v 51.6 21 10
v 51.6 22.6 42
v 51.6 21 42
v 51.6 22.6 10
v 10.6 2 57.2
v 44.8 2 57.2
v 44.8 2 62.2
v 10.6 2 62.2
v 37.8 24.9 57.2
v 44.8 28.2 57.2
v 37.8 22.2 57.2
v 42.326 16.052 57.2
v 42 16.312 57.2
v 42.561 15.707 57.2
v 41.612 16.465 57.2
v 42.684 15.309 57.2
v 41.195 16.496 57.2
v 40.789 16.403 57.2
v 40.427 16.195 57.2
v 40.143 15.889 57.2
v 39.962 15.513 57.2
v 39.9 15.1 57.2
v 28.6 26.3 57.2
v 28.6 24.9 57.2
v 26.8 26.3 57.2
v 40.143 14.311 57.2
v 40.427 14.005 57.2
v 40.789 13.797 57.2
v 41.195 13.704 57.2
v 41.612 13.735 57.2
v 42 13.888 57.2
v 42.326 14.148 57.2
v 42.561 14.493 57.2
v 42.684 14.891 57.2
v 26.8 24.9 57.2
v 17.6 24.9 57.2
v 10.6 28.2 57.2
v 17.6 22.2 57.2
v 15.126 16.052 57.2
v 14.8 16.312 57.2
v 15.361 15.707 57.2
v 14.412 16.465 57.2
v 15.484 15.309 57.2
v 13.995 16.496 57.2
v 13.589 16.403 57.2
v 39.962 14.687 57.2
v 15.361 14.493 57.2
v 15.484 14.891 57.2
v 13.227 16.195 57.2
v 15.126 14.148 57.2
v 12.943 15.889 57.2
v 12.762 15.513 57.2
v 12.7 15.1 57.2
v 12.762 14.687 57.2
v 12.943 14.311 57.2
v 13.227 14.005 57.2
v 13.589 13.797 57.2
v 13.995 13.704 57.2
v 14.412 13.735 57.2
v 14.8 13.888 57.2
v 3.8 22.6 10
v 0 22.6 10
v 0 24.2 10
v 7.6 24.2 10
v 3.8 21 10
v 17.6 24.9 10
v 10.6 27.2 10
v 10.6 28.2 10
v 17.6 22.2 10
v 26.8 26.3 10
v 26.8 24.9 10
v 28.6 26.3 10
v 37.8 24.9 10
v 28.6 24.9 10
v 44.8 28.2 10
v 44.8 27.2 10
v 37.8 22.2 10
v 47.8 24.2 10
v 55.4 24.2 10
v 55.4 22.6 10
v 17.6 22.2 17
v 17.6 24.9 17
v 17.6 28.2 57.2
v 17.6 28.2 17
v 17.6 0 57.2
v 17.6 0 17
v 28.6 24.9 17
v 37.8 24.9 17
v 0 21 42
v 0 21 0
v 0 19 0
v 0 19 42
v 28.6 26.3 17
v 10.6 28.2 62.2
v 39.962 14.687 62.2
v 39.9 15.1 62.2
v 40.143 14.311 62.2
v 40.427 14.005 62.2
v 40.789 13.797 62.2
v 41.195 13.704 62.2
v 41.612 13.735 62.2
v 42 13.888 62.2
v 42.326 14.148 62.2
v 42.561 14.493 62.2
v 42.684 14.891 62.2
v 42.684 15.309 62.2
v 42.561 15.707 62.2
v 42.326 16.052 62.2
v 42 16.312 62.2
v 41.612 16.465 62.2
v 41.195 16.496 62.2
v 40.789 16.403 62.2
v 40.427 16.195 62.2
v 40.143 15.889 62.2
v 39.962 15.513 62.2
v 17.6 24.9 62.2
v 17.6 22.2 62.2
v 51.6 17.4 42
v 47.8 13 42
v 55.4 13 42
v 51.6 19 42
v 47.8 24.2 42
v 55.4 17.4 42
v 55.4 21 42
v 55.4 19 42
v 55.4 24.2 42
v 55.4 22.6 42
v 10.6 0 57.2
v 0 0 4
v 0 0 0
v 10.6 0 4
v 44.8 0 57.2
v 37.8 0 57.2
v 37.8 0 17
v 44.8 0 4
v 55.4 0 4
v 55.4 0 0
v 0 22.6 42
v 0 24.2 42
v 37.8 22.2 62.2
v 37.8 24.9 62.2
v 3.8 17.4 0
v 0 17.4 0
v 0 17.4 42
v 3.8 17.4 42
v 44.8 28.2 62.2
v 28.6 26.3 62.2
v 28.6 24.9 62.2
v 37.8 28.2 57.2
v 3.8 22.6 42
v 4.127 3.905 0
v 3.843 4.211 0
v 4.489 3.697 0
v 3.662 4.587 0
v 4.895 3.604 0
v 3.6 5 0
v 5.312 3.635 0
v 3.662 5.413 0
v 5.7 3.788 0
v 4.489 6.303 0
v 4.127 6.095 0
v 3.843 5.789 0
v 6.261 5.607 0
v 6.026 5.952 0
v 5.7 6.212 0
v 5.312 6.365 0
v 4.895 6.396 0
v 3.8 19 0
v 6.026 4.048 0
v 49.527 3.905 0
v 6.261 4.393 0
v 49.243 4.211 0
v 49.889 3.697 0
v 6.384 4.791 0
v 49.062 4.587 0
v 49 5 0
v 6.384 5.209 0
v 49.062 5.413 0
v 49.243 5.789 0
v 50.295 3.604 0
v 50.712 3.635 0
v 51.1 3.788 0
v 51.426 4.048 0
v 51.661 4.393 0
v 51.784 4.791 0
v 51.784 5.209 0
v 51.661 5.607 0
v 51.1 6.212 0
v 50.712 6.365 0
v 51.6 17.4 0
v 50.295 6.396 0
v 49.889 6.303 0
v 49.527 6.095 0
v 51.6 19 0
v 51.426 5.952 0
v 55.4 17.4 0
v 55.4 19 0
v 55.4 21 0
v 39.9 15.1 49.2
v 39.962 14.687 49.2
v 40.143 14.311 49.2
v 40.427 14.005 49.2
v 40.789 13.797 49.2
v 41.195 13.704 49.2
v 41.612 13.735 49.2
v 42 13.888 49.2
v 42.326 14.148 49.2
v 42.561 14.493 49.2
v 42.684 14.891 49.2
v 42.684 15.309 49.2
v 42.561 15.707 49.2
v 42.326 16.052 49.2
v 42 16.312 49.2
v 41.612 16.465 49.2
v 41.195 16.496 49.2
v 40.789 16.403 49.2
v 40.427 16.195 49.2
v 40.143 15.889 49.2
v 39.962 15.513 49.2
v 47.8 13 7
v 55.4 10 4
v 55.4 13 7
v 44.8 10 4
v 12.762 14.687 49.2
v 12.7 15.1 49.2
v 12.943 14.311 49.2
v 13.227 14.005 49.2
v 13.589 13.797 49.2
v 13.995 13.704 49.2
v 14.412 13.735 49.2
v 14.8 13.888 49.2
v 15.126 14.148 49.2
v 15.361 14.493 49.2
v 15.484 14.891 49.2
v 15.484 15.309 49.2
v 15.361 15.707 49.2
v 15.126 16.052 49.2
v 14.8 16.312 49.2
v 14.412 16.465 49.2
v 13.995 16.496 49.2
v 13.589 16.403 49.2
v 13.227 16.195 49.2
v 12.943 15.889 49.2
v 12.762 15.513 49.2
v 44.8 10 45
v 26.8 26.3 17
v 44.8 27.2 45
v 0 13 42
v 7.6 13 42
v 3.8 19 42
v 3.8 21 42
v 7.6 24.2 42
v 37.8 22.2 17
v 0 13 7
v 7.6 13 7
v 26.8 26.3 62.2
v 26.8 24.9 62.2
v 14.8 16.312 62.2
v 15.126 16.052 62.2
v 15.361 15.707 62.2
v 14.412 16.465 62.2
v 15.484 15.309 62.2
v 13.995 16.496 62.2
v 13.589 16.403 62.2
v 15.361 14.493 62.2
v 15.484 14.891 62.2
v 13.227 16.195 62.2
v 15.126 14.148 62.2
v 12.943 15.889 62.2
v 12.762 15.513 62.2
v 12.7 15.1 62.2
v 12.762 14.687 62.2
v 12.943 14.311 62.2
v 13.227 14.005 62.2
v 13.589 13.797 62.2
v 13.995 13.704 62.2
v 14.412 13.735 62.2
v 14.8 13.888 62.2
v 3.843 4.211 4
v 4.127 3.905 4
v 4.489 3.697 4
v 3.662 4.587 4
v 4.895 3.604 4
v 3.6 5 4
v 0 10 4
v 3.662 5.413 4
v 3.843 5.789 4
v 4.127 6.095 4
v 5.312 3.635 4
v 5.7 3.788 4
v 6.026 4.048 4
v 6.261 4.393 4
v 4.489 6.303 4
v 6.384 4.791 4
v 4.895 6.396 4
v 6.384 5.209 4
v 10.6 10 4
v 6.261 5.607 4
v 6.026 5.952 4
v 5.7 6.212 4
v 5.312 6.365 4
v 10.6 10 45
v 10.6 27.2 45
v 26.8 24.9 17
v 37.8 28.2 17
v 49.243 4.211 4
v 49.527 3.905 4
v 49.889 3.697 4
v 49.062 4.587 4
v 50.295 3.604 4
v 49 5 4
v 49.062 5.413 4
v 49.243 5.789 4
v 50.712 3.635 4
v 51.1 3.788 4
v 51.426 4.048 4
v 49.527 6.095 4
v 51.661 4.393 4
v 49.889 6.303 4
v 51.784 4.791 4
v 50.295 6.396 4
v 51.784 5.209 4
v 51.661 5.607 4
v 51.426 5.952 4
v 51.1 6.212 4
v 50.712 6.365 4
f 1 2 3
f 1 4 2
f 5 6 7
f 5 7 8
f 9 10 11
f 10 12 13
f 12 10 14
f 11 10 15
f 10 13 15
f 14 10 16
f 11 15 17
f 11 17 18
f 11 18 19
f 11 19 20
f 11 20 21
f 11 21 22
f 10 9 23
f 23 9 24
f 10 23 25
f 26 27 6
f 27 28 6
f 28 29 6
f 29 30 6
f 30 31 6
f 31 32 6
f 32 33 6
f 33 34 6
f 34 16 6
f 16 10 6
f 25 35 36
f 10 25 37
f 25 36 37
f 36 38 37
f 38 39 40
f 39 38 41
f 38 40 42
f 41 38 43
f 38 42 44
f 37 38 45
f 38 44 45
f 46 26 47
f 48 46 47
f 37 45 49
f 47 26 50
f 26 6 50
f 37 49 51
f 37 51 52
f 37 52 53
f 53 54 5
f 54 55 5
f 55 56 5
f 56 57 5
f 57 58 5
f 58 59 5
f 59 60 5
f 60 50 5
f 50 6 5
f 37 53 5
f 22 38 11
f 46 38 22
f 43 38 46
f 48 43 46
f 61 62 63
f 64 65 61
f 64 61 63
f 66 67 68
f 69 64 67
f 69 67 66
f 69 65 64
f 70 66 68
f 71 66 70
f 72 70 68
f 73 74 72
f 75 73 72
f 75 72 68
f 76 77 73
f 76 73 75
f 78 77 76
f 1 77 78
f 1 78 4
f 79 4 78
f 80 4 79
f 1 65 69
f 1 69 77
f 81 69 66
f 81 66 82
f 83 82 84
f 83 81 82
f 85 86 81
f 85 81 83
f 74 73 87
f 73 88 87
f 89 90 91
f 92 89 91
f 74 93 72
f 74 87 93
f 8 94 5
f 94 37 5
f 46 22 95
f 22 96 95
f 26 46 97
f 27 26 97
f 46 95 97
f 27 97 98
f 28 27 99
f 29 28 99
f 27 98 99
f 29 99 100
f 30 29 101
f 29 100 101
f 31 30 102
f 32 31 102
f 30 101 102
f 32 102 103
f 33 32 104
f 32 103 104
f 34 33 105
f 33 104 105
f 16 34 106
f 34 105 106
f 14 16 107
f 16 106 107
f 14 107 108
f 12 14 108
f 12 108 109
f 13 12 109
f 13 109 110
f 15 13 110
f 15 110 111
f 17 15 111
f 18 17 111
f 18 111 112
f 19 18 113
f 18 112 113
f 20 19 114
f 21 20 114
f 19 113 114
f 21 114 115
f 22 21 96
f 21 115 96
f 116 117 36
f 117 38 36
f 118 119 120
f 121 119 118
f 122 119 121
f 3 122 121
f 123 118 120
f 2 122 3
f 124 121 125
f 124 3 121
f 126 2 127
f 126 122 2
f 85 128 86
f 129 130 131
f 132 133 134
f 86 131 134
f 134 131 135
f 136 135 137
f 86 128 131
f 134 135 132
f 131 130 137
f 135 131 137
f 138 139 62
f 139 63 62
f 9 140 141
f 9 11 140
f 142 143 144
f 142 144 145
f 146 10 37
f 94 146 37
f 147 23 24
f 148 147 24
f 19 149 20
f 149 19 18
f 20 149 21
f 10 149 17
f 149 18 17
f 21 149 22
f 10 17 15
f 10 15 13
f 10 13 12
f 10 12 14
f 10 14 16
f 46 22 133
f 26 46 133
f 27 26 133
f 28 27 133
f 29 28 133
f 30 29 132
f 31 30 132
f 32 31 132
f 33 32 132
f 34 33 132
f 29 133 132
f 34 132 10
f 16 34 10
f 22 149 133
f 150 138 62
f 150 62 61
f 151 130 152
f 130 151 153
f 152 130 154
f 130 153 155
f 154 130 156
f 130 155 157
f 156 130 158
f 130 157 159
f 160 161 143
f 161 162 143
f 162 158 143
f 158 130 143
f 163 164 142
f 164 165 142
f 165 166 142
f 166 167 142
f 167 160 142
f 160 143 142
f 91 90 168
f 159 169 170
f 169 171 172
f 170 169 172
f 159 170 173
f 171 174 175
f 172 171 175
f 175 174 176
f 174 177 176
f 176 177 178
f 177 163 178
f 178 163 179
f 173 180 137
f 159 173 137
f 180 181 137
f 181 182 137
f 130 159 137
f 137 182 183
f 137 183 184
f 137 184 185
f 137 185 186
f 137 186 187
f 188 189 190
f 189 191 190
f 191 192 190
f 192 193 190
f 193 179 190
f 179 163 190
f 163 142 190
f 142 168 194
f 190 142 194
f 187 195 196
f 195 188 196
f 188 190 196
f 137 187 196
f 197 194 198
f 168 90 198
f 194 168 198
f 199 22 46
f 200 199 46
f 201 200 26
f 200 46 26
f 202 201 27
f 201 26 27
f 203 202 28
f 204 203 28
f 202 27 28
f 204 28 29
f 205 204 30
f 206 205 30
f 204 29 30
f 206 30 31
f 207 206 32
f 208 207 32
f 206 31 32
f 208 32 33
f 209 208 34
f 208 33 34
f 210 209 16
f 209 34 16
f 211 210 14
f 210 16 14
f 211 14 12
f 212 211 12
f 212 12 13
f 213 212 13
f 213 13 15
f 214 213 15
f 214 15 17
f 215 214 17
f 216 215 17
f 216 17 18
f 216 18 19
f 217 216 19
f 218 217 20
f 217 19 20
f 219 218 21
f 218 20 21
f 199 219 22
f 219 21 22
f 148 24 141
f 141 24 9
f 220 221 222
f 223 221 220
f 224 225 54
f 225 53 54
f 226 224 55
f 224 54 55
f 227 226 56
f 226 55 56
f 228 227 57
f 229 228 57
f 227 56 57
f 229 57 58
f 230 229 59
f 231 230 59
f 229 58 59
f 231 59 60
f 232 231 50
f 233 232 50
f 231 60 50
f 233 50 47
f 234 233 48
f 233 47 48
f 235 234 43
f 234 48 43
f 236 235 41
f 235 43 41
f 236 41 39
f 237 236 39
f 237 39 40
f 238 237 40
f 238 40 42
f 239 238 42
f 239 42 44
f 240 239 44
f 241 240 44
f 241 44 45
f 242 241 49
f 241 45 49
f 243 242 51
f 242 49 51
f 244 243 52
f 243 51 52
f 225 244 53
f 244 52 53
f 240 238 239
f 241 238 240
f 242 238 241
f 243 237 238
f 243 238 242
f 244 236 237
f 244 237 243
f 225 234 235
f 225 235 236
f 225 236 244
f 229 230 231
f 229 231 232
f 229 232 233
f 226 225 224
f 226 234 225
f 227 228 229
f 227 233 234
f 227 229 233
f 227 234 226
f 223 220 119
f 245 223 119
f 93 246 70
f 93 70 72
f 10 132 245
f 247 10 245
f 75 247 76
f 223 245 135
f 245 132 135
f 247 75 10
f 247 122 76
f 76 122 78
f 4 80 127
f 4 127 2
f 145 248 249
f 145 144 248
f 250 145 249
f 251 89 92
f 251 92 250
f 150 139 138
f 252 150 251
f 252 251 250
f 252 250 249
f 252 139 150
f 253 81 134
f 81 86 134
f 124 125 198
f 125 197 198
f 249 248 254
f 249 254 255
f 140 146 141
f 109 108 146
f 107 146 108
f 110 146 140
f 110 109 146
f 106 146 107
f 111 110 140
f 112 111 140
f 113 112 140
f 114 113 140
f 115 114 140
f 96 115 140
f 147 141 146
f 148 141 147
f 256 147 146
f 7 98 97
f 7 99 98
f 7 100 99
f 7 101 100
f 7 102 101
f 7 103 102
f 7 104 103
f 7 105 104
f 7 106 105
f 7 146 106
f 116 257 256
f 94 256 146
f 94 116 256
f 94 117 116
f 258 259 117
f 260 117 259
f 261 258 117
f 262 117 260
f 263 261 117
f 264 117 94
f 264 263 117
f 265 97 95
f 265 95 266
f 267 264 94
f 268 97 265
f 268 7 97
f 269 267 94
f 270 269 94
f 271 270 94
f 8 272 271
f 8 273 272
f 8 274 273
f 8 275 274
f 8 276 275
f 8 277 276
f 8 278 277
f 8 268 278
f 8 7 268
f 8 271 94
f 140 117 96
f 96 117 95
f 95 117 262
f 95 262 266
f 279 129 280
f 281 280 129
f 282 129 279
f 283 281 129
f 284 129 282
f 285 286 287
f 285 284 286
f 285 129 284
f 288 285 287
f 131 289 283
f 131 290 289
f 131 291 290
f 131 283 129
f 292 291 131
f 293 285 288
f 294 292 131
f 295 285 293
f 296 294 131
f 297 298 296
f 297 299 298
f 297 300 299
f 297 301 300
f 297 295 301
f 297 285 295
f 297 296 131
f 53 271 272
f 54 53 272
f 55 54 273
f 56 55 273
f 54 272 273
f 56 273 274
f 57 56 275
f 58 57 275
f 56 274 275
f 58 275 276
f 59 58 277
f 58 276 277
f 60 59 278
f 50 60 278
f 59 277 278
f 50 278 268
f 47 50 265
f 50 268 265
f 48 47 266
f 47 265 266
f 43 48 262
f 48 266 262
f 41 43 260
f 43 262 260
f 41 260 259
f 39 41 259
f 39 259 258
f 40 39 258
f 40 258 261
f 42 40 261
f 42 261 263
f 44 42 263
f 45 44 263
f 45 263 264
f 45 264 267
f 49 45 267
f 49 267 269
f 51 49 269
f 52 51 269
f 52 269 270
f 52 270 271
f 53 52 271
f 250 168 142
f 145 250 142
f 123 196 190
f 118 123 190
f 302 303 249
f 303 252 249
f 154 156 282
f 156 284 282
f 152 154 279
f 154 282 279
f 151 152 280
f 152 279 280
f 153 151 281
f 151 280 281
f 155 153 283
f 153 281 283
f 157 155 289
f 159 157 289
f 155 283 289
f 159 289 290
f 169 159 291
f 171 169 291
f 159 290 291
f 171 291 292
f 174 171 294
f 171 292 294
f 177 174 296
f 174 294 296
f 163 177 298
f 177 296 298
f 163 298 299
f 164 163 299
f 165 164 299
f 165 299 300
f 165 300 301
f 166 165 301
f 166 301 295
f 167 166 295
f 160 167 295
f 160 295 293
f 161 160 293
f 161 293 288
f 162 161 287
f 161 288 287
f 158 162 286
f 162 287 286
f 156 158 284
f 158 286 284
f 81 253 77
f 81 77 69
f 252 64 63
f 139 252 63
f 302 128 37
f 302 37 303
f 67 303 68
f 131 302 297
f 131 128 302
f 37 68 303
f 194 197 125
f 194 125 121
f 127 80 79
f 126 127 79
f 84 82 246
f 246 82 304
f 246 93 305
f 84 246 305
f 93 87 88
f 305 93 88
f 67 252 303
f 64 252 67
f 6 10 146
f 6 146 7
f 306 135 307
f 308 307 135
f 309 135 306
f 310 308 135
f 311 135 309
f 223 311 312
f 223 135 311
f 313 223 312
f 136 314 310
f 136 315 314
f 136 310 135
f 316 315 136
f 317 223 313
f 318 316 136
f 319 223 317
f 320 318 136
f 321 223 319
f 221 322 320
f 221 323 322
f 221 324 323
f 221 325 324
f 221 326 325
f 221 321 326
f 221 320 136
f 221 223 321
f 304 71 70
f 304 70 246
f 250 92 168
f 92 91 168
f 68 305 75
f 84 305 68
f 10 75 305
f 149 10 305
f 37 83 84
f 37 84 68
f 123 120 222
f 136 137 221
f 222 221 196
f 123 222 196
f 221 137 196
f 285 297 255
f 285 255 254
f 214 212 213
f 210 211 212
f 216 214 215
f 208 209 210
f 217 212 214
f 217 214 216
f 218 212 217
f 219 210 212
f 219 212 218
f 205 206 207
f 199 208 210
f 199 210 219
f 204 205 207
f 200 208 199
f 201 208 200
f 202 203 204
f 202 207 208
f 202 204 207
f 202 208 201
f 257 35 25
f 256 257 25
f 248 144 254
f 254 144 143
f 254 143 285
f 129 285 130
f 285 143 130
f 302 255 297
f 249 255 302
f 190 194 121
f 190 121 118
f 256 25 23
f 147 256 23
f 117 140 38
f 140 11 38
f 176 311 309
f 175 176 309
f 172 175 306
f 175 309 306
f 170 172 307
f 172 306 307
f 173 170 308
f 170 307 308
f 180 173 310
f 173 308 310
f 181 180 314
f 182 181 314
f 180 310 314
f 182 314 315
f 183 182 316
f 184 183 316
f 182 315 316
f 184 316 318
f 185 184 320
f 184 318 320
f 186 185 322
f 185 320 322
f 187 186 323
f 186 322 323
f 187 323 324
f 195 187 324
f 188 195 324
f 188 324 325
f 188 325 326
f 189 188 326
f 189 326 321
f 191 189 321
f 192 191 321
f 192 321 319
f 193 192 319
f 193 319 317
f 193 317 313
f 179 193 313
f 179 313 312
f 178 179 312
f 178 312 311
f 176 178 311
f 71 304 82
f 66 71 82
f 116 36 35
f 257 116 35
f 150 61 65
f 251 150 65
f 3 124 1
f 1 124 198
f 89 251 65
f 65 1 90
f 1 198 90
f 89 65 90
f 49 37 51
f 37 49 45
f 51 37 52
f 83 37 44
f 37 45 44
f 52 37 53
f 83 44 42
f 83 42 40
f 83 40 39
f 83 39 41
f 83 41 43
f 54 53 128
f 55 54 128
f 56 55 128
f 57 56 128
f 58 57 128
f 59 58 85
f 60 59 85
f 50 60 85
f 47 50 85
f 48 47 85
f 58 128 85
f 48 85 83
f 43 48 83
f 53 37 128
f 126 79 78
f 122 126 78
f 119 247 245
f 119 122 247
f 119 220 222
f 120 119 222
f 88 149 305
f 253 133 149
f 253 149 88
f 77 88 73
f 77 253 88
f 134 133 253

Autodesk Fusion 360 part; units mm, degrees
sketch "Base" plane through (0, 0, 0) normal (0, 0, 1) x (1, 0, 0) in component "NeckServoMount"
  line L0 (0, 0) -> (55.4, 0)
  line L1 (55.4, 0) -> (55.4, 24.2)
  line L2 (55.4, 24.2) -> (0, 24.2)
  line L3 (0, 24.2) -> (0, 0)
  line L4 (0, 13) -> (55.4, 13)
  line L5 (0, 19) -> (55.4, 19) construction
  line L6 (0, 17.4) -> (55.4, 17.4) construction
  line L7 (0, 21) -> (55.4, 21) construction
  line L8 (0, 22.6) -> (55.4, 22.6) construction
  line L9 (3.8, 22.6) -> (3.8, 21)
  line L10 (3.8, 19) -> (3.8, 17.4)
  line L11 (0, 22.6) -> (3.8, 22.6)
  line L12 (3.8, 21) -> (0, 21)
  line L13 (0, 19) -> (3.8, 19)
  line L14 (0, 17.4) -> (3.8, 17.4)
  line L15 (27.7, 24.2) -> (27.7, 0) construction
  line L16 (55.4, 22.6) -> (51.6, 22.6)
  line L17 (51.6, 22.6) -> (51.6, 21)
  line L18 (51.6, 21) -> (55.4, 21)
  line L19 (51.6, 19) -> (51.6, 17.4)
  line L20 (55.4, 19) -> (51.6, 19)
  line L21 (55.4, 17.4) -> (51.6, 17.4)
  dimension "d1" = 55.4
  dimension "d3" = 13
  dimension "d4" = 4.4
  dimension "d5" = 1.6
  dimension "d6" = 2
  dimension "d7" = 1.6
  dimension "d8" = 1.6
  dimension "d9" = 3.8
extrude "ExtrudeSlottedVertical" add sketch "Base" along normal blind 42 contours L1 L2 L3 L4 L9 L10 L11 L12 L13 L14 L16 L17 L18 L19 L20 L21 makes body 1 in component "NeckServoMount"
extrude "ExtrudeBasePlate" add sketch "Base" along normal blind 4 contours L0 L1 L3 L4 bodies 1 in component "NeckServoMount"
sketch "Back" plane through (0, 24.2, 0) normal (0, 1, 0) x (-1, 0, 0) in component "NeckServoMount"
  line L0 (-55.4, 0) -> (0, 0)
  line L1 (0, 0) -> (0, 42)
  line L2 (0, 42) -> (-55.4, 42)
  line L3 (-55.4, 42) -> (-55.4, 0)
  line L4 (-55.4, 0) -> (0.6, 0)
  line L5 (0.6, 0) -> (0.6, 10)
  line L6 (0.6, 10) -> (-55.4, 10)
  line L7 (-55.4, 10) -> (-55.4, 0)
  dimension "d19" = 10
extrude "CutBackAway" cut sketch "Back" against normal up to surface (3.2 mm away) contours L0 L1 L3 L4 L6 L7 bodies 1 in component "NeckServoMount"
chamfer "Chamfer1" distance 3 angle 45 1 edges at (27.7, 13, 4) on bodies 1 in component "NeckServoMount"
sketch "ScrewHoles" plane through (0, 0, 4) normal (0, 0, 1) x (-1, 0, 0) in component "NeckServoMount"
  line L0 (-55.4, -10) -> (0, -10)
  line L1 (0, -10) -> (0, 0)
  line L2 (0, 0) -> (-55.4, 0)
  line L3 (-55.4, 0) -> (-55.4, -10)
  line L4 (0, -5) -> (-55.4, -5) construction
  circle A0 centre (-5, -5) radius 1.4
  line L5 (-27.7, 0) -> (-27.7, -10) construction
  circle A1 centre (-50.4, -5) radius 1.4
  dimension "d23" = 2.8
  dimension "d49" = 5
extrude "CutScrewHoles" cut sketch "ScrewHoles" against normal up to surface (4 mm away) contours A0 | A1 bodies 1 in component "NeckServoMount"
sketch "ServoU" plane through (0, 24.2, 0) normal (0, 1, 0) x (-1, 0, 0) in component "NeckServoMount"
  line L0 (-55.4, 10) -> (0, 10)
  line L1 (0, 10) -> (0, 42)
  line L2 (0, 42) -> (-55.4, 42)
  line L3 (-55.4, 42) -> (-55.4, 10)
  line L4 (0, 0) -> (-55.4, 0)
  line L5 (-37.8, 57.2) -> (-17.6, 57.2)
  line L6 (-17.6, 57.2) -> (-17.6, 17)
  line L7 (-17.6, 17) -> (-37.8, 17)
  line L8 (-37.8, 17) -> (-37.8, 57.2)
  line L9 (-10.6, 57.2) -> (-10.6, 3)
  line L10 (-44.8, 57.2) -> (-44.8, 3)
  line L11 (-44.8, 3) -> (-10.6, 3)
  line L12 (-10.6, 57.2) -> (-17.6, 57.2)
  line L13 (-37.8, 57.2) -> (-44.8, 57.2)
  point P0 (-10.6, 57.2)
  point P1 (-44.8, 57.2)
  dimension "d26" = 20.2
  dimension "d27" = 40.2
  dimension "d29" = 17.6
  dimension "d31" = 17
  dimension "d34" = 7
  dimension "d35" = 7
  dimension "d36" = 14
extrude "ExtrudeServoU" add sketch "ServoU" against normal up to surface (22.2 mm away) from surface at -2 contours L0 L2 L6 L7 L8 L9 L10 | L0 L9 L10 L11 | L2 L8 L10 L13 | L2 L6 L9 L12 bodies 1 in component "NeckServoMount"
extrude "CutServoU" cut sketch "ServoU" against normal blind 2 contours L0 L2 L6 L7 L8 L9 L10 | L0 L9 L10 L11 | L2 L8 L10 L13 | L2 L6 L9 L12 bodies 1 in component "NeckServoMount"
extrude "CutServoU2" cut sketch "ServoU" against normal through all contours L2 L5 L6 L8 | L2 L6 L7 L8 bodies 1 in component "NeckServoMount"
extrude "CutBackAwayAgain" cut sketch "Back" against normal up to surface (3.2 mm away) contours L0 L1 L3 L4 L6 L7 bodies 1 in component "NeckServoMount"
sketch "BottomSlot" plane through (0, 0, 17) normal (0, 0, 1) x (-1, 0, 0) in component "NeckServoMount"
  line L0 (-17.6, -22.2) -> (-17.6, 0)
  line L1 (-17.6, 0) -> (-37.8, 0)
  line L2 (-37.8, 0) -> (-37.8, -22.2)
  line L3 (-37.8, -22.2) -> (-17.6, -22.2)
  line L4 (-17.6, -22.2) -> (-37.8, -22.2)
  line L5 (-37.8, -22.2) -> (-37.8, -24.9)
  line L6 (-37.8, -24.9) -> (-17.6, -24.9)
  line L7 (-17.6, -24.9) -> (-17.6, -22.2)
  dimension "d54" = 2.7
  dimension "d55" = 20.2
extrude "ExtrudeSlotHolder" add 1 faces at (15.2667, 22.2, 38.7333) along direction (0, 1, 0) blind 6 on bodies 1 bodies 1 in component "NeckServoMount"
extrude "CutBottomSlot" cut sketch "BottomSlot" against normal up to surface (7 mm away) contours L3 L4 L5 L6 L7 bodies 1 in component "NeckServoMount"
sketch "TinySlot" plane through (0, 24.9, 0) normal (0, -1, 0) x (1, 0, 0)
  line L0 (17.6, 10) -> (37.8, 10)
  line L1 (37.8, 10) -> (37.8, 17)
  line L2 (37.8, 17) -> (17.6, 17)
  line L3 (17.6, 17) -> (17.6, 10)
  line L4 (26.8, 17) -> (28.6, 17)
  line L5 (28.6, 17) -> (28.6, 10)
  line L6 (28.6, 10) -> (26.8, 10)
  line L7 (26.8, 10) -> (26.8, 17)
  point P0 (27.7, 17)
  point P1 (27.7, 17)
  dimension "d61" = 1.8
  dimension "d62" = 7
extrude "CutTinySlot" cut sketch "TinySlot" against normal blind 1.4 contours L0 L2 L4 L5 L6 L7 bodies 1 in component "NeckServoMount"
sketch "TopPlate" plane through (0, 0, 57.2) normal (0, 0, 1) x (-1, 0, 0) in component "TopPlate"
  line L0 (-10.6, 0) -> (-17.6, 0)
  line L1 (-17.6, 0) -> (-17.6, -28.2)
  line L2 (-17.6, -28.2) -> (-10.6, -28.2)
  line L3 (-10.6, -28.2) -> (-10.6, 0)
  line L4 (-10.6, -28.2) -> (-44.8, -28.2)
  line L5 (-44.8, -28.2) -> (-44.8, -2)
  line L6 (-44.8, -2) -> (-10.6, -2)
  line L7 (-10.6, -2) -> (-10.6, -28.2)
  line L8 (-44.8, -10) -> (-44.8, 0)
  line L9 (-17.6, -24.9) -> (-26.8, -24.9)
  line L10 (-37.8, -22.2) -> (-17.6, -22.2)
  line L11 (-26.8, -24.9) -> (-26.8, -26.3)
  line L12 (-26.8, -26.3) -> (-28.6, -26.3)
  line L13 (-28.6, -26.3) -> (-28.6, -24.9)
  line L14 (-28.6, -24.9) -> (-37.8, -24.9)
  line L15 (-37.8, -24.9) -> (-37.8, -28.2)
  line L16 (-37.8, -28.2) -> (-17.6, -28.2)
  line L17 (-17.6, -28.2) -> (-17.6, -24.9)
  line L18 (-17.6, -24.9) -> (-26.8, -24.9)
  line L19 (-37.8, 0) -> (-37.8, -28.2)
  line L20 (-17.6, -22.2) -> (-37.8, -22.2)
  dimension "d66" = 2
extrude "ExtrudeTopPlate" add sketch "TopPlate" along normal blind 5 separate body contours L1 L2 L3 L4 L6 L7 L17 | L1 L6 L10 L19 L20 | L4 L5 L6 L8 L15 L19 | L1 L4 L9 L11 L12 L13 L14 L15 L16 L17 L18 L19 makes body 2 in component "TopPlate"
sketch "ScrewHoles (2)" plane through (0, 0, 62.2) normal (0, 0, 1) x (-1, 0, 0) in component "TopPlate"
  line L0 (-17.6, -22.2) -> (-17.6, -24.9)
  line L1 (-17.6, -24.9) -> (-26.8, -24.9)
  line L2 (-26.8, -24.9) -> (-26.8, -26.3)
  line L3 (-26.8, -26.3) -> (-28.6, -26.3)
  line L4 (-28.6, -26.3) -> (-28.6, -24.9)
  line L5 (-28.6, -24.9) -> (-37.8, -24.9)
  line L6 (-37.8, -24.9) -> (-37.8, -22.2)
  line L7 (-37.8, -22.2) -> (-17.6, -22.2)
  line L8 (-44.8, -28.2) -> (-10.6, -28.2)
  line L9 (-10.6, -28.2) -> (-10.6, -2)
  line L10 (-10.6, -2) -> (-44.8, -2)
  line L11 (-44.8, -2) -> (-44.8, -28.2)
  line L12 (-37.8, 0) -> (-44.8, 0)
  line L13 (-37.8, -28.2) -> (-44.8, -28.2) construction
  line L14 (-41.3, -28.2) -> (-41.3, 0) construction
  line L15 (-41.3, -28.2) -> (-41.3, -2) construction
  circle A0 centre (-41.3, -15.1) radius 1.4
  line L16 (-27.7, -2) -> (-27.7, -28.2) construction
  circle A1 centre (-14.1, -15.1) radius 1.4
  point P0 (-41.3, 0)
  point P1 (-41.3, -28.2)
  point P2 (-41.3, -2)
  point P3 (-41.3, -15.1)
  dimension "d69" = 2.8
extrude "CutHoles" cut sketch "ScrewHoles (2)" against normal blind 13 contours A0 | A1 bodies 1 in component "NeckServoMount"
extrude "Extrude2" cut sketch "ScrewHoles (2)" against normal blind 13 contours A0 | A1 bodies 2 in component "TopPlate"
chamfer "Chamfer3" distance 3 angle 45 6 edges at (44.8, 13, 24.5) (10.6, 13, 24.5) (10.6, 24.2, 26) (44.8, 24.2, 26) (10.6, 18.6, 42) (44.8, 18.6, 42) on bodies 1 in component "NeckServoMount"
component "NeckServoMount" placed x (1, 0, 0) y (0, 1, 0) z (0, 0, 1) at (0, 0, 0)
component "TopPlate" placed x (1, 0, 0) y (0, 1, 0) z (0, 0, 1) at (0, 0, 0)
equation "servo_offset_x = 17.6 mm"
equation "d29 = servo_offset_x"
equation "servo_offset_z = 17 mm"
equation "d31 = servo_offset_z"
equation "servo_offset_y = 2 mm"
equation "d38 = -servo_offset_y"
equation "d41 = -servo_offset_y"
